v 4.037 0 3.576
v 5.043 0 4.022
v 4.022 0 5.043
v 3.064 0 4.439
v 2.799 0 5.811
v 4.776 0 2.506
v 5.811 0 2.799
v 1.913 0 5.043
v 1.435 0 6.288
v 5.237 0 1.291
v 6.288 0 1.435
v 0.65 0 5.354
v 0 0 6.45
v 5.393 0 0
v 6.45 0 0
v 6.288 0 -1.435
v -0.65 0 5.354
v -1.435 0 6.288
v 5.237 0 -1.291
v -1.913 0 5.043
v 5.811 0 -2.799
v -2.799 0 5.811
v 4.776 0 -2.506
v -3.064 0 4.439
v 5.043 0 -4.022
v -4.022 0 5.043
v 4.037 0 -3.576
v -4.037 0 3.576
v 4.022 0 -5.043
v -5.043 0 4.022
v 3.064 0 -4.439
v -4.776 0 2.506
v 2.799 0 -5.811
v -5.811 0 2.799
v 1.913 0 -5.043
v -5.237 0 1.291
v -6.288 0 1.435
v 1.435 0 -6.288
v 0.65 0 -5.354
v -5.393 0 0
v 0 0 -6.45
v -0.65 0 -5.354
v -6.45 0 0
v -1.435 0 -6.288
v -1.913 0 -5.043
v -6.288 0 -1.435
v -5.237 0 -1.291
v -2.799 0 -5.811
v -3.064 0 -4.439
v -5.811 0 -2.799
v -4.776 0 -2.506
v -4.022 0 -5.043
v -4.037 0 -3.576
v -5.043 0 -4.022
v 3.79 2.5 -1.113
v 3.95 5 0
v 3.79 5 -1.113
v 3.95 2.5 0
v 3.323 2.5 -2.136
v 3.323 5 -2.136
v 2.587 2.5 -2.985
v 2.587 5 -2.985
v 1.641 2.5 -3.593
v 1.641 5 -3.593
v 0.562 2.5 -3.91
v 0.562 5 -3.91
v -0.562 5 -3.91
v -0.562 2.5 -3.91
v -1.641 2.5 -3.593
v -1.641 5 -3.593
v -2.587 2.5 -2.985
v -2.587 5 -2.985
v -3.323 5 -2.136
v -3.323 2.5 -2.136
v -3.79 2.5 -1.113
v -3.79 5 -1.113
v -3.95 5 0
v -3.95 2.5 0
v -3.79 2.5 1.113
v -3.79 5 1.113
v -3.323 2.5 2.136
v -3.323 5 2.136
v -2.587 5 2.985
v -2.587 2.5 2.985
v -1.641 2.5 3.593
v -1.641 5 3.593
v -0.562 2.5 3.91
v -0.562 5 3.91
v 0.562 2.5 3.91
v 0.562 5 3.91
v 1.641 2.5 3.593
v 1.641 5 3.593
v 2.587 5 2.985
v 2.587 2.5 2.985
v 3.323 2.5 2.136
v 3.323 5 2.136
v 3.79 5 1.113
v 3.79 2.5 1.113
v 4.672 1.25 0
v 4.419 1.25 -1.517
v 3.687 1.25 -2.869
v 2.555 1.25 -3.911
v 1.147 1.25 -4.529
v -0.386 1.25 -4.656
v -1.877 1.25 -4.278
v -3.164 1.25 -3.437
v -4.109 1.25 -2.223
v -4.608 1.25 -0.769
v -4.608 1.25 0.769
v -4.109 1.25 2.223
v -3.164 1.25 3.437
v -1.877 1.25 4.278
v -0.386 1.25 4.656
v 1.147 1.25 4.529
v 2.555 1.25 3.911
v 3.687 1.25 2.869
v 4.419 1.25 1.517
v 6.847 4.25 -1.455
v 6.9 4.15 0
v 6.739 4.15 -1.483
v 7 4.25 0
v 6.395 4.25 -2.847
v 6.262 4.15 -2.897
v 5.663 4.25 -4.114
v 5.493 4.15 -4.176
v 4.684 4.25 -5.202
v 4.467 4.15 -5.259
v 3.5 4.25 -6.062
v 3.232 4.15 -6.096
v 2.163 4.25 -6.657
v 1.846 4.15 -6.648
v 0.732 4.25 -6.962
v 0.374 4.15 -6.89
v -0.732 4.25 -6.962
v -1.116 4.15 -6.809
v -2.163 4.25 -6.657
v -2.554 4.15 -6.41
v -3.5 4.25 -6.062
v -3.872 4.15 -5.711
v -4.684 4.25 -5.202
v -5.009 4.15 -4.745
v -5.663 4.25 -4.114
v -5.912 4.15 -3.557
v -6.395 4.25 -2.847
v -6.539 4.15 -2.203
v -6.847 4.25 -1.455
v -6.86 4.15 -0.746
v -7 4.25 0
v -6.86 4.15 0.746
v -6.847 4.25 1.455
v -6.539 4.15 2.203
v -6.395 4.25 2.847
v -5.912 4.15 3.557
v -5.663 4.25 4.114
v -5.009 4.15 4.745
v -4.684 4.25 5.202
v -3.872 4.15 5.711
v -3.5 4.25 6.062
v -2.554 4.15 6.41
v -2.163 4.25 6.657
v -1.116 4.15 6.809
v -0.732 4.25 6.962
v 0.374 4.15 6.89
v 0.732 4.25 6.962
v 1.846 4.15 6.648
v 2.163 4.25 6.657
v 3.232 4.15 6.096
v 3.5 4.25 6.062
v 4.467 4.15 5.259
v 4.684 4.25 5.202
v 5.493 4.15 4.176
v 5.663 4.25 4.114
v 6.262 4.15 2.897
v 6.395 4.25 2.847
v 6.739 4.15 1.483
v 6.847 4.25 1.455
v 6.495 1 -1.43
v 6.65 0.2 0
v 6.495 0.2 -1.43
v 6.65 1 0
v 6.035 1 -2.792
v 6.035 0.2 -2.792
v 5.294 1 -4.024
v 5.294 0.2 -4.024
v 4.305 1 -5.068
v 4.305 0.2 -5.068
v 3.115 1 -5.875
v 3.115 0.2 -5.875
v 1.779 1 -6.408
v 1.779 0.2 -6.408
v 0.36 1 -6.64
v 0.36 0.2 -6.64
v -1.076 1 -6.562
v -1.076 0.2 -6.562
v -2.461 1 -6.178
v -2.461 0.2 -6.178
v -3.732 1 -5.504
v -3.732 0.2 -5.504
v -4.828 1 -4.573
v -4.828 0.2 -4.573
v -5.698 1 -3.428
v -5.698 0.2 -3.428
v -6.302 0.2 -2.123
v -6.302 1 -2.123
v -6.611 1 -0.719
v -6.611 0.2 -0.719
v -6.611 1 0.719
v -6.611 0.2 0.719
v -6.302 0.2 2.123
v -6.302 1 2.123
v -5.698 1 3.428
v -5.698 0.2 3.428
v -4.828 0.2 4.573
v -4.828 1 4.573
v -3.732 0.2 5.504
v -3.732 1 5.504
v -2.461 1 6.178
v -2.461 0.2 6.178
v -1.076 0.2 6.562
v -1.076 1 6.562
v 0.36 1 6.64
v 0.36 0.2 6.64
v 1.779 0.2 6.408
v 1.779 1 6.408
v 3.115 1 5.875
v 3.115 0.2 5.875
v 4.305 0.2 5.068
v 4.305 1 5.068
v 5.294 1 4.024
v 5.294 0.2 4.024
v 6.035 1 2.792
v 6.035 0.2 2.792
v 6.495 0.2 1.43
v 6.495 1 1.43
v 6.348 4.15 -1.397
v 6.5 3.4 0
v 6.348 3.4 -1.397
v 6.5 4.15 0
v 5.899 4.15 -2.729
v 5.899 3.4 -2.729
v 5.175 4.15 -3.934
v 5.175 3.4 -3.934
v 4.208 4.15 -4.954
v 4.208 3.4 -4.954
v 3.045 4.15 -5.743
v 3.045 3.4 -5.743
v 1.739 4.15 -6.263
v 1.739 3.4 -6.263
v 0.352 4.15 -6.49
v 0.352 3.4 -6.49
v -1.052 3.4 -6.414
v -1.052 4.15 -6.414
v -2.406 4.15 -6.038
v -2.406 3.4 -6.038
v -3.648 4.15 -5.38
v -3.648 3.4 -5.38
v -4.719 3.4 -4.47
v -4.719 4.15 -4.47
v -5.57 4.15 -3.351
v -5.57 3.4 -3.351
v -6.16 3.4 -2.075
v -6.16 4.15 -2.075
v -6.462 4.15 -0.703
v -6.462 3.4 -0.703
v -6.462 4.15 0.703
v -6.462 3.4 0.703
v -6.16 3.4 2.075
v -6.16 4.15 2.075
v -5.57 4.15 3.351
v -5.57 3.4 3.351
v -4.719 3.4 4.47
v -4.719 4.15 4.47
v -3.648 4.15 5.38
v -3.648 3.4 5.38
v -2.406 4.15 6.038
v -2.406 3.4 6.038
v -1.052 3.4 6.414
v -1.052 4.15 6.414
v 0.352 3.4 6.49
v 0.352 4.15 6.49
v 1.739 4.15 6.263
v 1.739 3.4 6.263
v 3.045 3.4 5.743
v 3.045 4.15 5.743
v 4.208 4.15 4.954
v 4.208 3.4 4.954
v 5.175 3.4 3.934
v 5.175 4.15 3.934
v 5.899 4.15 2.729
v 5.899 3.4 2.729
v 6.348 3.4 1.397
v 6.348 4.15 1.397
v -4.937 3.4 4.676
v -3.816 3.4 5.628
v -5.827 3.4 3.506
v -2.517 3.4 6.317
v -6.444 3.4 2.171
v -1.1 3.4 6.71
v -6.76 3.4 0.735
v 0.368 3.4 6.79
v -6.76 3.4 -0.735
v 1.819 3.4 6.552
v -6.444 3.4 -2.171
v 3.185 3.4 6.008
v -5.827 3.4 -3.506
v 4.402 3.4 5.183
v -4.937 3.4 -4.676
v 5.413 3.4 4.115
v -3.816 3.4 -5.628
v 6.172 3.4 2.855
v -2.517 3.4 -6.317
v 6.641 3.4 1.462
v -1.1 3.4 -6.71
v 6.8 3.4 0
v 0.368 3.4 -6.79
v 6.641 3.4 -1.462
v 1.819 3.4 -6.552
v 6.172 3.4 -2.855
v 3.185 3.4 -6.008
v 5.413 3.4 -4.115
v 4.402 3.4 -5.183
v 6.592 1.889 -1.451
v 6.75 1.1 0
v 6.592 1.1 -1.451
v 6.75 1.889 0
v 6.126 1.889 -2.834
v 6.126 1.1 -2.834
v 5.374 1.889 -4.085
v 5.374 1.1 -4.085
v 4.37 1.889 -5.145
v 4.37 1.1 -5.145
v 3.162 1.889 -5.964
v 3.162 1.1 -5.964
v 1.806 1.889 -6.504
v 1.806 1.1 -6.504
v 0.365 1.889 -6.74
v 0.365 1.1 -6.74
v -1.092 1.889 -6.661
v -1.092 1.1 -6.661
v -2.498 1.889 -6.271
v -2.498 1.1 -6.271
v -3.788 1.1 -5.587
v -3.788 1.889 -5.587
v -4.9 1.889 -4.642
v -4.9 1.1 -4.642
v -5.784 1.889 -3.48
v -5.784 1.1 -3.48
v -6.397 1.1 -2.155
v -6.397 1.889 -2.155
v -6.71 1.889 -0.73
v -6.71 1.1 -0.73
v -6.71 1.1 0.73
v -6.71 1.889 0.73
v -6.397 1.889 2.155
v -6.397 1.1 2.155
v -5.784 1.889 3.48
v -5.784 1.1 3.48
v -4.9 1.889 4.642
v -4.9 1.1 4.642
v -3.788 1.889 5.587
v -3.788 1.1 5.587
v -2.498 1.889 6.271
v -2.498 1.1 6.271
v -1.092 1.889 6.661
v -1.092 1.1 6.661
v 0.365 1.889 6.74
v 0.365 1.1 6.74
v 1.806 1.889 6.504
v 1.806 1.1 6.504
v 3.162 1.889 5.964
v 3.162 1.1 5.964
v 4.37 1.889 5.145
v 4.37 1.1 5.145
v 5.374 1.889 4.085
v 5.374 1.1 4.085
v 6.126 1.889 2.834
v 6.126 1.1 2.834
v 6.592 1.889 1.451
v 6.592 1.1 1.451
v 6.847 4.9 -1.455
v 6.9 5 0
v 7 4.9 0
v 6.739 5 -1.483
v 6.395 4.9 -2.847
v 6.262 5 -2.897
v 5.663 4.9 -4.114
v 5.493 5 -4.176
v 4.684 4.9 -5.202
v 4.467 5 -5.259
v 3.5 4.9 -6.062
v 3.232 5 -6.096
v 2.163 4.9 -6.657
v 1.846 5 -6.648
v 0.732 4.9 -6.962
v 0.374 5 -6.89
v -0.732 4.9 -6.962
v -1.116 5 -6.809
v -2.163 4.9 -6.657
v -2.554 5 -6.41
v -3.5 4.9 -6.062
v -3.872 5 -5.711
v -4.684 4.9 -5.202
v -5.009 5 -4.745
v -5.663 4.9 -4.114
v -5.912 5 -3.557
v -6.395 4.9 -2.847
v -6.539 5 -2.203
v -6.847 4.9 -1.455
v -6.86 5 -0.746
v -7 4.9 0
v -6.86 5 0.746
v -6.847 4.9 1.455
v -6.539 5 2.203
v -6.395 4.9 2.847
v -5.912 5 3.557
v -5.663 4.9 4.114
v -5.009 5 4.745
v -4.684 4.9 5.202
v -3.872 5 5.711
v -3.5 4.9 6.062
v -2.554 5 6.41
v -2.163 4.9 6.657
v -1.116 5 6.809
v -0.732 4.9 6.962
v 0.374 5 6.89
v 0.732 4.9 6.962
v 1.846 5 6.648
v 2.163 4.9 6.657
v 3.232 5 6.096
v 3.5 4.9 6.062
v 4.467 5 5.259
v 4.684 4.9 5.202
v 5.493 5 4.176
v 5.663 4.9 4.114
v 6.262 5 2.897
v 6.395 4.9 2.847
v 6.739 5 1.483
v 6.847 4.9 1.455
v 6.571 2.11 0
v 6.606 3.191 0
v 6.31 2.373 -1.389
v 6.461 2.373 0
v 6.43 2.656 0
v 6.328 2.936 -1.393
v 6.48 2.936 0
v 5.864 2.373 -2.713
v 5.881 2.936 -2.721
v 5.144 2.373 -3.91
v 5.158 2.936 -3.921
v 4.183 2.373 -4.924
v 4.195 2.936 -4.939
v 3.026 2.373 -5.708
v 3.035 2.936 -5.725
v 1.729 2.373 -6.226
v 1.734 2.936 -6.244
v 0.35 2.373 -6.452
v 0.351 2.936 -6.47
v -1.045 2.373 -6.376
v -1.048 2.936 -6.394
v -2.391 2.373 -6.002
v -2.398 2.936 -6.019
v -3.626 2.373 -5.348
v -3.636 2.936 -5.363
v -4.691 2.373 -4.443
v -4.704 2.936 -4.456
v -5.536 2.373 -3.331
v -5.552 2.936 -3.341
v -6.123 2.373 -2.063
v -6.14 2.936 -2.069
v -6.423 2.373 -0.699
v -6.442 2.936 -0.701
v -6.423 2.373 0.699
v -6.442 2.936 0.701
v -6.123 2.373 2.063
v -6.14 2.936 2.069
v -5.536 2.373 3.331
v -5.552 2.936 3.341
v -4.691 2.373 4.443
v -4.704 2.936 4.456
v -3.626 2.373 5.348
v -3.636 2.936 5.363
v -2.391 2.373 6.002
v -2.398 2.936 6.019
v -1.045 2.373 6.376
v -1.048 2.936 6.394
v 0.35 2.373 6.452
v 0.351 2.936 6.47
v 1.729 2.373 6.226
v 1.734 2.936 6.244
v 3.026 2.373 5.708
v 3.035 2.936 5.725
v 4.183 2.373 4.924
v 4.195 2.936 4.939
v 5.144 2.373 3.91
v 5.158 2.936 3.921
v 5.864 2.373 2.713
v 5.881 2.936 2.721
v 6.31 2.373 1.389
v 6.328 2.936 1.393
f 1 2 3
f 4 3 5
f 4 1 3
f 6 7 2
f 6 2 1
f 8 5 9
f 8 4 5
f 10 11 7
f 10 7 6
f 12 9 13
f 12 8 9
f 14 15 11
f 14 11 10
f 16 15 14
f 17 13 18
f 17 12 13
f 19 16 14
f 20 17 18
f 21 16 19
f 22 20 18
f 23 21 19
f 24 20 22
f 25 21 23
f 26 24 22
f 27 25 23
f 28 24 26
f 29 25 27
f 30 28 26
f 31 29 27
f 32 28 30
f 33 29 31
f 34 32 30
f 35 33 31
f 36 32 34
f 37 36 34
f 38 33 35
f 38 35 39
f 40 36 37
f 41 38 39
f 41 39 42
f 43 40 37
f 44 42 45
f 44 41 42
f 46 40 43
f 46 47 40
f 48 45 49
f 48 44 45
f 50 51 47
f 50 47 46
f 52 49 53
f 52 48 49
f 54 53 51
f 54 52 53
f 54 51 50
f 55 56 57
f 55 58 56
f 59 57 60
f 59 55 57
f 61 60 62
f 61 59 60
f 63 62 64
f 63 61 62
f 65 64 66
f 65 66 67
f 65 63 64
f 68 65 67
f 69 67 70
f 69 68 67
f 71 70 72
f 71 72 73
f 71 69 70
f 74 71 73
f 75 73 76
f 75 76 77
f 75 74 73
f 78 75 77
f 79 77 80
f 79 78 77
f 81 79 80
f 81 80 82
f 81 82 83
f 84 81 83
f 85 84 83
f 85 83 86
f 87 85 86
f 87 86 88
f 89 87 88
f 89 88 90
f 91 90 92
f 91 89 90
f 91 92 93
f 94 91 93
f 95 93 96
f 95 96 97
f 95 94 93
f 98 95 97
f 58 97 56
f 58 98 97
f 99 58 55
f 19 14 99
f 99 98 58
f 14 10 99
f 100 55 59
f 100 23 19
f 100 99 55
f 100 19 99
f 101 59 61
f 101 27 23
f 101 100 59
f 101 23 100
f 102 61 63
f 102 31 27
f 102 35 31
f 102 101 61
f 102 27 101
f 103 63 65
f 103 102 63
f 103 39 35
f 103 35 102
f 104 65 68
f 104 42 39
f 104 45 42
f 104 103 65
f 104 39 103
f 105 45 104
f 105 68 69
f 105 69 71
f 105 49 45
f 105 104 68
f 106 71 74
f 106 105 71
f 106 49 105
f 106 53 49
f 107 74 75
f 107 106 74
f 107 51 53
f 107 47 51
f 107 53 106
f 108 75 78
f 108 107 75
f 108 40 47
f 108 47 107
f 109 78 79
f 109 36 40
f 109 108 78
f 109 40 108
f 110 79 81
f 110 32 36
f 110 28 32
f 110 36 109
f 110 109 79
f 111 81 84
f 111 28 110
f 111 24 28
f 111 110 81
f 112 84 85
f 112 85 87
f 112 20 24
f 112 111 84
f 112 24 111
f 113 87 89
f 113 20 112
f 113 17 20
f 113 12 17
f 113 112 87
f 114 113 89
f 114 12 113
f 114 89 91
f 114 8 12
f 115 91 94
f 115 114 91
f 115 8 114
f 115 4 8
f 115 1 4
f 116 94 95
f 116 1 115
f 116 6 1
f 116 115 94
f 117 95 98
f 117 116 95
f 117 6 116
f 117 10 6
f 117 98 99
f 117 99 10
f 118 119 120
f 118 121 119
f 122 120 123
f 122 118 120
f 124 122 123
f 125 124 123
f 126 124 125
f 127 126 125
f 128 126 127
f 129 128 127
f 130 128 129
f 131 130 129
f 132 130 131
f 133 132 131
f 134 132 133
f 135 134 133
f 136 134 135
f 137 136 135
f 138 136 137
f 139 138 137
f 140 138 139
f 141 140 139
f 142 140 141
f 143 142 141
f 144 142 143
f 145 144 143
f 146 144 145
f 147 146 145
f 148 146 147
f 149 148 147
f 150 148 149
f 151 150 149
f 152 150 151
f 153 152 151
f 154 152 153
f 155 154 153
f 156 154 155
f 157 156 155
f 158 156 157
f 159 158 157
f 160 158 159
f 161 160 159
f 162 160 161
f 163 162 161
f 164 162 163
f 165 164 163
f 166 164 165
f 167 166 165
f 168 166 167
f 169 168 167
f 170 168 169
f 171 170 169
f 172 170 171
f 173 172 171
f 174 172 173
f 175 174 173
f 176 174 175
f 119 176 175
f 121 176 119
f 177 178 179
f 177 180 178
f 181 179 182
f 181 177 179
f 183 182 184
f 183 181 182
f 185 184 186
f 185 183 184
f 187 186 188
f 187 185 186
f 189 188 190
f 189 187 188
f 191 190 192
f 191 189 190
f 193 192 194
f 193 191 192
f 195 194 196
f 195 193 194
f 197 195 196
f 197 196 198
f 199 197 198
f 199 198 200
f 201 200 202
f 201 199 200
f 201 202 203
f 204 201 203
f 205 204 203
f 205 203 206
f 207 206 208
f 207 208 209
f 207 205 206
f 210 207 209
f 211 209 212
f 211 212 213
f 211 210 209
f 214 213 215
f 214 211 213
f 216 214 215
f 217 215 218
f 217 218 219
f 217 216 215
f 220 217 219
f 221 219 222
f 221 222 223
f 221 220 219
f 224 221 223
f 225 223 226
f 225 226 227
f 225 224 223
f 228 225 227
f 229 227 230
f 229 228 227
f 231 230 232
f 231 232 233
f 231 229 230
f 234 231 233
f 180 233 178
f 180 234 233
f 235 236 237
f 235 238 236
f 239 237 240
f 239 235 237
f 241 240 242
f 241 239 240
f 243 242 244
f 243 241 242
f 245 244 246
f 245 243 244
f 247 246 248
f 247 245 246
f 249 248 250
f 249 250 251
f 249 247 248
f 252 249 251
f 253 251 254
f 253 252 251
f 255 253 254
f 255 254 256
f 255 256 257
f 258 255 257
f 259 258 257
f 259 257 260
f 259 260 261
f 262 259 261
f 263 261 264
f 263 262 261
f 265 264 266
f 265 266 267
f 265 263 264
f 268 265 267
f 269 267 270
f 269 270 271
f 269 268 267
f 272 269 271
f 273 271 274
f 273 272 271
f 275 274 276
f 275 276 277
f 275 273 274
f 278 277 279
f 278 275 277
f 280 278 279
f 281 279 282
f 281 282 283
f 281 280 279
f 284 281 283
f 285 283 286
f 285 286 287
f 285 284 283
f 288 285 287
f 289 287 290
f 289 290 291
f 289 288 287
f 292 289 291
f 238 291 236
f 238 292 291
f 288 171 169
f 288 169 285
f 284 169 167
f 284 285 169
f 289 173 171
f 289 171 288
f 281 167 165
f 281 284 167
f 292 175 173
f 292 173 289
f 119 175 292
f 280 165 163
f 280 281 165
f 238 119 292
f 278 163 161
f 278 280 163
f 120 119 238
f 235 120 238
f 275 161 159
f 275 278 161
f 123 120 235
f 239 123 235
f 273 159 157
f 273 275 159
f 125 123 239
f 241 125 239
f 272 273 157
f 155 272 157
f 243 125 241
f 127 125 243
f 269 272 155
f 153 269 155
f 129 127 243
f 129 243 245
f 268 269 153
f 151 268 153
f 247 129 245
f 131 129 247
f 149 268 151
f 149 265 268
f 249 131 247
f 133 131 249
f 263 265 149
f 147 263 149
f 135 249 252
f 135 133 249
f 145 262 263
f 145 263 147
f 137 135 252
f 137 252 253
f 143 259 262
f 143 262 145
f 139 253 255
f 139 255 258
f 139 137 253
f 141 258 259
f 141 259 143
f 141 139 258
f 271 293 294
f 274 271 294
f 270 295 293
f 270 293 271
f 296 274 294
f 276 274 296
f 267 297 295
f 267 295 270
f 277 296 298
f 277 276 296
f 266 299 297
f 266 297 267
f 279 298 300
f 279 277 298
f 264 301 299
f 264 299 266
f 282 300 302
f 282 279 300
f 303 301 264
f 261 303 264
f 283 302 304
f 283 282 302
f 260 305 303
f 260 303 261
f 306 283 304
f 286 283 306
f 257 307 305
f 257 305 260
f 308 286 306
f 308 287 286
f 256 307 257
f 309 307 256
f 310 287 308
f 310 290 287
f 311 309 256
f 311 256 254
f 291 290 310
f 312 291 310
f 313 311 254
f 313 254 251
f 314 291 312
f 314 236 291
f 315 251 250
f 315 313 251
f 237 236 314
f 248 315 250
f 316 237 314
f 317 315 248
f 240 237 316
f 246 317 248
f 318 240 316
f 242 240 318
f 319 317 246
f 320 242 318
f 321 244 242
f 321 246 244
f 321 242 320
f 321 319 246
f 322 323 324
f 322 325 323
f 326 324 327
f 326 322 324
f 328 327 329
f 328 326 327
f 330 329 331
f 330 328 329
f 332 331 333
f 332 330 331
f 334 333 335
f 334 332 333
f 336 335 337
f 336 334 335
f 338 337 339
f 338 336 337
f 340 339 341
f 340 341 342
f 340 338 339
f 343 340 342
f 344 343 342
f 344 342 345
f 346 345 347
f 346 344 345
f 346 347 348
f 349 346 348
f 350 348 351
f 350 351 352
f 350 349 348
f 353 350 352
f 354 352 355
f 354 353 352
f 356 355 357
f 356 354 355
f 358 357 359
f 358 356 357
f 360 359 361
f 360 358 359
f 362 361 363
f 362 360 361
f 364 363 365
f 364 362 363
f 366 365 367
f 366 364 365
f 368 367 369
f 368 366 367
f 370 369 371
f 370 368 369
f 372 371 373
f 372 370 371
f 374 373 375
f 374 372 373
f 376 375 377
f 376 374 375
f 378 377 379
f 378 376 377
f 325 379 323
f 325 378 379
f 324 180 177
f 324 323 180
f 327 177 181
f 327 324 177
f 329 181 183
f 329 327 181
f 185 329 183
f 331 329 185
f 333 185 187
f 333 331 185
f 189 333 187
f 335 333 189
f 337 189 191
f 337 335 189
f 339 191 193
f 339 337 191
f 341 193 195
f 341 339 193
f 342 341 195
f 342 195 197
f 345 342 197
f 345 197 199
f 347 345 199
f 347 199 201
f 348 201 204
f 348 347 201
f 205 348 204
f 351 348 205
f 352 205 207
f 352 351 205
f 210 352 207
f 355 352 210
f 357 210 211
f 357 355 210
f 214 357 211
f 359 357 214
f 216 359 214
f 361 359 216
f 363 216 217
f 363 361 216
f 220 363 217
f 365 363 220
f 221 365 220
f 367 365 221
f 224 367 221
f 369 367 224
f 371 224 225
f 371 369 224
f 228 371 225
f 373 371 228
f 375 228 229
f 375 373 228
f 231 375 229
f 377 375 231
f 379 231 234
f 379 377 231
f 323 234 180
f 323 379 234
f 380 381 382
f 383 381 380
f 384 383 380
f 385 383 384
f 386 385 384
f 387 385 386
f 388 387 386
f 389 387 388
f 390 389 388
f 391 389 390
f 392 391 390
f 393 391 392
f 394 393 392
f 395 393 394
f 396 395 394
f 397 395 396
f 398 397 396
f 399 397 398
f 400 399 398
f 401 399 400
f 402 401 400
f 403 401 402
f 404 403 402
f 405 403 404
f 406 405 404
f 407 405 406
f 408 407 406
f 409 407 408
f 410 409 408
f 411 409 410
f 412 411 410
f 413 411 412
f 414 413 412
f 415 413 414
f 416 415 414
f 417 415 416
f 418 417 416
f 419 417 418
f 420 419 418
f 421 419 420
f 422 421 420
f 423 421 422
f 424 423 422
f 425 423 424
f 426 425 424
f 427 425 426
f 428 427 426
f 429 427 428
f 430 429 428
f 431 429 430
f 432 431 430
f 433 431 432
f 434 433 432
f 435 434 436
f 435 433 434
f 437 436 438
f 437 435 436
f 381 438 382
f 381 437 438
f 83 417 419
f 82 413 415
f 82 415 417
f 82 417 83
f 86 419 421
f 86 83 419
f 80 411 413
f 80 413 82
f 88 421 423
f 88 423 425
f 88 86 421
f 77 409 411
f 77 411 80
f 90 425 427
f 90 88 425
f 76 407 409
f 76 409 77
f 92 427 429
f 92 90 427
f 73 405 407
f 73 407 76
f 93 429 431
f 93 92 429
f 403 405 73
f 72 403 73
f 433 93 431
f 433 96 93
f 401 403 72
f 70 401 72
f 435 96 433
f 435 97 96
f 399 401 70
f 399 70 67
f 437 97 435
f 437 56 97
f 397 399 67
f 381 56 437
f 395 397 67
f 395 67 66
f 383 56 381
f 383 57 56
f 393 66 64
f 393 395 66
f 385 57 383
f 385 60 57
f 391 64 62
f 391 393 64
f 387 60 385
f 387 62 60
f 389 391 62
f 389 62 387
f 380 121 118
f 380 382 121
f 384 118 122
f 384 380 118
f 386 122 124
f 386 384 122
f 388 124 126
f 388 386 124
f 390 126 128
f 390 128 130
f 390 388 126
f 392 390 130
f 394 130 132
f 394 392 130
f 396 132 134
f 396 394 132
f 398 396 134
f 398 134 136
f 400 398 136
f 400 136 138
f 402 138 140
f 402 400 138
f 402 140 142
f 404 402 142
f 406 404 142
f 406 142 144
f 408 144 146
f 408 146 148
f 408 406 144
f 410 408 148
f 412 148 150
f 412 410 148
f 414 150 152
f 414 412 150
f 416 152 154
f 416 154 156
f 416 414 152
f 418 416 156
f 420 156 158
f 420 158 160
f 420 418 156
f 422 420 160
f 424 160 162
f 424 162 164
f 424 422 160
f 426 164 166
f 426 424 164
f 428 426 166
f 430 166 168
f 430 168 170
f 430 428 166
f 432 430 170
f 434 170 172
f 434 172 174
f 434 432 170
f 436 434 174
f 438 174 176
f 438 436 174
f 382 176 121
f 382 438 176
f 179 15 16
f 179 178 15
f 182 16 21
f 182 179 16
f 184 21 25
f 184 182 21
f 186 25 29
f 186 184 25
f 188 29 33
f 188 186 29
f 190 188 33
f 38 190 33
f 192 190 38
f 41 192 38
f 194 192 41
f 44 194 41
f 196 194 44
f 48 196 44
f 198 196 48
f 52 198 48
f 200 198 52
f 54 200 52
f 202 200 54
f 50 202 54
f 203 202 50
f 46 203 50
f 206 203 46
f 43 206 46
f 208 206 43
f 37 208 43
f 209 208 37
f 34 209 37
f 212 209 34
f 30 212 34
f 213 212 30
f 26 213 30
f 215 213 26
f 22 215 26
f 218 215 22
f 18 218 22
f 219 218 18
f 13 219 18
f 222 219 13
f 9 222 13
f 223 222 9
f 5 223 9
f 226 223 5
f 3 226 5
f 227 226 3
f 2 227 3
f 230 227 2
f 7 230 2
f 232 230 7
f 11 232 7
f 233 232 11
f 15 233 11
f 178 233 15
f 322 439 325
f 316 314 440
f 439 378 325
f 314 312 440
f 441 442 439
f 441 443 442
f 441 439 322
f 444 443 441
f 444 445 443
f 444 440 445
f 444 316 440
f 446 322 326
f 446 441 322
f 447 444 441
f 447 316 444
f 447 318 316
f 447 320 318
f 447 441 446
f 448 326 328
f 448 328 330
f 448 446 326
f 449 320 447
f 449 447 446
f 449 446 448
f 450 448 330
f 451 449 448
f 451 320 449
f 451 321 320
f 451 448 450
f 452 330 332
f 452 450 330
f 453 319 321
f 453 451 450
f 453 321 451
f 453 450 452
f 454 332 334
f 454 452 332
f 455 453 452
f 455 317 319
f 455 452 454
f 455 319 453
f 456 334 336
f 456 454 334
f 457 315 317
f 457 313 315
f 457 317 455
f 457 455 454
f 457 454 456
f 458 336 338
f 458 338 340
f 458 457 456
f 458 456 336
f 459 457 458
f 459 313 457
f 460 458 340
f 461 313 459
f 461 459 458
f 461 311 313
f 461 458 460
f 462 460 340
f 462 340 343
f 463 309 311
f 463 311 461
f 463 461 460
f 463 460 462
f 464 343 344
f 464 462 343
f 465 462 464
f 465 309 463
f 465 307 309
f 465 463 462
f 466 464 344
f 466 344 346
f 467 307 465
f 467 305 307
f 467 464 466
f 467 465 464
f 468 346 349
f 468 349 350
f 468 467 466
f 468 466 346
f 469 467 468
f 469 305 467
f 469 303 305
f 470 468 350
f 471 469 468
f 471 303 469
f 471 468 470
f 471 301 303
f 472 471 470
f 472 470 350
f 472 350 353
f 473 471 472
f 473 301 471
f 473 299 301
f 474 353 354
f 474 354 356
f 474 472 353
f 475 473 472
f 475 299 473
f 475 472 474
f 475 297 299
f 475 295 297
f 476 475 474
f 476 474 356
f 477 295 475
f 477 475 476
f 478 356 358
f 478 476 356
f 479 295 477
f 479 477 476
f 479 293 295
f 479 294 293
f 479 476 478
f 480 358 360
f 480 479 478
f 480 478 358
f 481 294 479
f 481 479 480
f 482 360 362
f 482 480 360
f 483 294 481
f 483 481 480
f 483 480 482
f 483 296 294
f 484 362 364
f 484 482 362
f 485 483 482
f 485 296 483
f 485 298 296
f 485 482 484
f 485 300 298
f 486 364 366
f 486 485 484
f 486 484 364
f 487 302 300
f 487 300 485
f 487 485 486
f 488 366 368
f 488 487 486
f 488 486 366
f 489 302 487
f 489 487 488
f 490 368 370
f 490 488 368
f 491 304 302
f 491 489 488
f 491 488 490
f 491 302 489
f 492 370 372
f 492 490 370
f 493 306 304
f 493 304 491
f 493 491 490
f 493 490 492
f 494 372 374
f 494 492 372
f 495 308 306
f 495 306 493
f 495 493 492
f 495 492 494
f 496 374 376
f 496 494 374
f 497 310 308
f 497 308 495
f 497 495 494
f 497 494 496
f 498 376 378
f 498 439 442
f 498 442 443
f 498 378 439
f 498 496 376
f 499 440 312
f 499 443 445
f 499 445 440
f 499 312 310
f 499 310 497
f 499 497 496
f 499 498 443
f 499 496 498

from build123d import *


with BuildPart() as part:
    # Croquis1 → Revolución1 (revolve)
    with BuildSketch(Plane.XY):
        with BuildLine():
            Line((6.45, 0), (6.65, 0.2))
            Line((6.65, 0.2), (6.65, 1))
            Line((6.65, 1), (6.75, 1.1))
            Line((6.75, 1.1), (6.75, 1.767))
            Line((6.75, 1.767), (6.75, 1.889))
            ThreePointArc((6.75, 1.889), (6.429860393, 2.6559209), (6.8, 3.4))
            Line((6.8, 3.4), (6.5, 3.4))
            Line((6.5, 3.4), (6.5, 4.15))
            Line((6.5, 4.15), (6.9, 4.15))
            Line((6.9, 4.15), (7, 4.25))
            Line((7, 4.25), (7, 4.9))
            Line((7, 4.9), (6.9, 5))
            Line((6.9, 5), (3.95, 5))
            Line((3.95, 5), (3.95, 2.5))
            Line((3.95, 2.5), (5.393375673, 0))
            Line((5.393375673, 0), (6.45, 0))
        make_face()
    revolve(axis=Axis((0, 0, 0), (0, 1, 0)))


solid = part.part
